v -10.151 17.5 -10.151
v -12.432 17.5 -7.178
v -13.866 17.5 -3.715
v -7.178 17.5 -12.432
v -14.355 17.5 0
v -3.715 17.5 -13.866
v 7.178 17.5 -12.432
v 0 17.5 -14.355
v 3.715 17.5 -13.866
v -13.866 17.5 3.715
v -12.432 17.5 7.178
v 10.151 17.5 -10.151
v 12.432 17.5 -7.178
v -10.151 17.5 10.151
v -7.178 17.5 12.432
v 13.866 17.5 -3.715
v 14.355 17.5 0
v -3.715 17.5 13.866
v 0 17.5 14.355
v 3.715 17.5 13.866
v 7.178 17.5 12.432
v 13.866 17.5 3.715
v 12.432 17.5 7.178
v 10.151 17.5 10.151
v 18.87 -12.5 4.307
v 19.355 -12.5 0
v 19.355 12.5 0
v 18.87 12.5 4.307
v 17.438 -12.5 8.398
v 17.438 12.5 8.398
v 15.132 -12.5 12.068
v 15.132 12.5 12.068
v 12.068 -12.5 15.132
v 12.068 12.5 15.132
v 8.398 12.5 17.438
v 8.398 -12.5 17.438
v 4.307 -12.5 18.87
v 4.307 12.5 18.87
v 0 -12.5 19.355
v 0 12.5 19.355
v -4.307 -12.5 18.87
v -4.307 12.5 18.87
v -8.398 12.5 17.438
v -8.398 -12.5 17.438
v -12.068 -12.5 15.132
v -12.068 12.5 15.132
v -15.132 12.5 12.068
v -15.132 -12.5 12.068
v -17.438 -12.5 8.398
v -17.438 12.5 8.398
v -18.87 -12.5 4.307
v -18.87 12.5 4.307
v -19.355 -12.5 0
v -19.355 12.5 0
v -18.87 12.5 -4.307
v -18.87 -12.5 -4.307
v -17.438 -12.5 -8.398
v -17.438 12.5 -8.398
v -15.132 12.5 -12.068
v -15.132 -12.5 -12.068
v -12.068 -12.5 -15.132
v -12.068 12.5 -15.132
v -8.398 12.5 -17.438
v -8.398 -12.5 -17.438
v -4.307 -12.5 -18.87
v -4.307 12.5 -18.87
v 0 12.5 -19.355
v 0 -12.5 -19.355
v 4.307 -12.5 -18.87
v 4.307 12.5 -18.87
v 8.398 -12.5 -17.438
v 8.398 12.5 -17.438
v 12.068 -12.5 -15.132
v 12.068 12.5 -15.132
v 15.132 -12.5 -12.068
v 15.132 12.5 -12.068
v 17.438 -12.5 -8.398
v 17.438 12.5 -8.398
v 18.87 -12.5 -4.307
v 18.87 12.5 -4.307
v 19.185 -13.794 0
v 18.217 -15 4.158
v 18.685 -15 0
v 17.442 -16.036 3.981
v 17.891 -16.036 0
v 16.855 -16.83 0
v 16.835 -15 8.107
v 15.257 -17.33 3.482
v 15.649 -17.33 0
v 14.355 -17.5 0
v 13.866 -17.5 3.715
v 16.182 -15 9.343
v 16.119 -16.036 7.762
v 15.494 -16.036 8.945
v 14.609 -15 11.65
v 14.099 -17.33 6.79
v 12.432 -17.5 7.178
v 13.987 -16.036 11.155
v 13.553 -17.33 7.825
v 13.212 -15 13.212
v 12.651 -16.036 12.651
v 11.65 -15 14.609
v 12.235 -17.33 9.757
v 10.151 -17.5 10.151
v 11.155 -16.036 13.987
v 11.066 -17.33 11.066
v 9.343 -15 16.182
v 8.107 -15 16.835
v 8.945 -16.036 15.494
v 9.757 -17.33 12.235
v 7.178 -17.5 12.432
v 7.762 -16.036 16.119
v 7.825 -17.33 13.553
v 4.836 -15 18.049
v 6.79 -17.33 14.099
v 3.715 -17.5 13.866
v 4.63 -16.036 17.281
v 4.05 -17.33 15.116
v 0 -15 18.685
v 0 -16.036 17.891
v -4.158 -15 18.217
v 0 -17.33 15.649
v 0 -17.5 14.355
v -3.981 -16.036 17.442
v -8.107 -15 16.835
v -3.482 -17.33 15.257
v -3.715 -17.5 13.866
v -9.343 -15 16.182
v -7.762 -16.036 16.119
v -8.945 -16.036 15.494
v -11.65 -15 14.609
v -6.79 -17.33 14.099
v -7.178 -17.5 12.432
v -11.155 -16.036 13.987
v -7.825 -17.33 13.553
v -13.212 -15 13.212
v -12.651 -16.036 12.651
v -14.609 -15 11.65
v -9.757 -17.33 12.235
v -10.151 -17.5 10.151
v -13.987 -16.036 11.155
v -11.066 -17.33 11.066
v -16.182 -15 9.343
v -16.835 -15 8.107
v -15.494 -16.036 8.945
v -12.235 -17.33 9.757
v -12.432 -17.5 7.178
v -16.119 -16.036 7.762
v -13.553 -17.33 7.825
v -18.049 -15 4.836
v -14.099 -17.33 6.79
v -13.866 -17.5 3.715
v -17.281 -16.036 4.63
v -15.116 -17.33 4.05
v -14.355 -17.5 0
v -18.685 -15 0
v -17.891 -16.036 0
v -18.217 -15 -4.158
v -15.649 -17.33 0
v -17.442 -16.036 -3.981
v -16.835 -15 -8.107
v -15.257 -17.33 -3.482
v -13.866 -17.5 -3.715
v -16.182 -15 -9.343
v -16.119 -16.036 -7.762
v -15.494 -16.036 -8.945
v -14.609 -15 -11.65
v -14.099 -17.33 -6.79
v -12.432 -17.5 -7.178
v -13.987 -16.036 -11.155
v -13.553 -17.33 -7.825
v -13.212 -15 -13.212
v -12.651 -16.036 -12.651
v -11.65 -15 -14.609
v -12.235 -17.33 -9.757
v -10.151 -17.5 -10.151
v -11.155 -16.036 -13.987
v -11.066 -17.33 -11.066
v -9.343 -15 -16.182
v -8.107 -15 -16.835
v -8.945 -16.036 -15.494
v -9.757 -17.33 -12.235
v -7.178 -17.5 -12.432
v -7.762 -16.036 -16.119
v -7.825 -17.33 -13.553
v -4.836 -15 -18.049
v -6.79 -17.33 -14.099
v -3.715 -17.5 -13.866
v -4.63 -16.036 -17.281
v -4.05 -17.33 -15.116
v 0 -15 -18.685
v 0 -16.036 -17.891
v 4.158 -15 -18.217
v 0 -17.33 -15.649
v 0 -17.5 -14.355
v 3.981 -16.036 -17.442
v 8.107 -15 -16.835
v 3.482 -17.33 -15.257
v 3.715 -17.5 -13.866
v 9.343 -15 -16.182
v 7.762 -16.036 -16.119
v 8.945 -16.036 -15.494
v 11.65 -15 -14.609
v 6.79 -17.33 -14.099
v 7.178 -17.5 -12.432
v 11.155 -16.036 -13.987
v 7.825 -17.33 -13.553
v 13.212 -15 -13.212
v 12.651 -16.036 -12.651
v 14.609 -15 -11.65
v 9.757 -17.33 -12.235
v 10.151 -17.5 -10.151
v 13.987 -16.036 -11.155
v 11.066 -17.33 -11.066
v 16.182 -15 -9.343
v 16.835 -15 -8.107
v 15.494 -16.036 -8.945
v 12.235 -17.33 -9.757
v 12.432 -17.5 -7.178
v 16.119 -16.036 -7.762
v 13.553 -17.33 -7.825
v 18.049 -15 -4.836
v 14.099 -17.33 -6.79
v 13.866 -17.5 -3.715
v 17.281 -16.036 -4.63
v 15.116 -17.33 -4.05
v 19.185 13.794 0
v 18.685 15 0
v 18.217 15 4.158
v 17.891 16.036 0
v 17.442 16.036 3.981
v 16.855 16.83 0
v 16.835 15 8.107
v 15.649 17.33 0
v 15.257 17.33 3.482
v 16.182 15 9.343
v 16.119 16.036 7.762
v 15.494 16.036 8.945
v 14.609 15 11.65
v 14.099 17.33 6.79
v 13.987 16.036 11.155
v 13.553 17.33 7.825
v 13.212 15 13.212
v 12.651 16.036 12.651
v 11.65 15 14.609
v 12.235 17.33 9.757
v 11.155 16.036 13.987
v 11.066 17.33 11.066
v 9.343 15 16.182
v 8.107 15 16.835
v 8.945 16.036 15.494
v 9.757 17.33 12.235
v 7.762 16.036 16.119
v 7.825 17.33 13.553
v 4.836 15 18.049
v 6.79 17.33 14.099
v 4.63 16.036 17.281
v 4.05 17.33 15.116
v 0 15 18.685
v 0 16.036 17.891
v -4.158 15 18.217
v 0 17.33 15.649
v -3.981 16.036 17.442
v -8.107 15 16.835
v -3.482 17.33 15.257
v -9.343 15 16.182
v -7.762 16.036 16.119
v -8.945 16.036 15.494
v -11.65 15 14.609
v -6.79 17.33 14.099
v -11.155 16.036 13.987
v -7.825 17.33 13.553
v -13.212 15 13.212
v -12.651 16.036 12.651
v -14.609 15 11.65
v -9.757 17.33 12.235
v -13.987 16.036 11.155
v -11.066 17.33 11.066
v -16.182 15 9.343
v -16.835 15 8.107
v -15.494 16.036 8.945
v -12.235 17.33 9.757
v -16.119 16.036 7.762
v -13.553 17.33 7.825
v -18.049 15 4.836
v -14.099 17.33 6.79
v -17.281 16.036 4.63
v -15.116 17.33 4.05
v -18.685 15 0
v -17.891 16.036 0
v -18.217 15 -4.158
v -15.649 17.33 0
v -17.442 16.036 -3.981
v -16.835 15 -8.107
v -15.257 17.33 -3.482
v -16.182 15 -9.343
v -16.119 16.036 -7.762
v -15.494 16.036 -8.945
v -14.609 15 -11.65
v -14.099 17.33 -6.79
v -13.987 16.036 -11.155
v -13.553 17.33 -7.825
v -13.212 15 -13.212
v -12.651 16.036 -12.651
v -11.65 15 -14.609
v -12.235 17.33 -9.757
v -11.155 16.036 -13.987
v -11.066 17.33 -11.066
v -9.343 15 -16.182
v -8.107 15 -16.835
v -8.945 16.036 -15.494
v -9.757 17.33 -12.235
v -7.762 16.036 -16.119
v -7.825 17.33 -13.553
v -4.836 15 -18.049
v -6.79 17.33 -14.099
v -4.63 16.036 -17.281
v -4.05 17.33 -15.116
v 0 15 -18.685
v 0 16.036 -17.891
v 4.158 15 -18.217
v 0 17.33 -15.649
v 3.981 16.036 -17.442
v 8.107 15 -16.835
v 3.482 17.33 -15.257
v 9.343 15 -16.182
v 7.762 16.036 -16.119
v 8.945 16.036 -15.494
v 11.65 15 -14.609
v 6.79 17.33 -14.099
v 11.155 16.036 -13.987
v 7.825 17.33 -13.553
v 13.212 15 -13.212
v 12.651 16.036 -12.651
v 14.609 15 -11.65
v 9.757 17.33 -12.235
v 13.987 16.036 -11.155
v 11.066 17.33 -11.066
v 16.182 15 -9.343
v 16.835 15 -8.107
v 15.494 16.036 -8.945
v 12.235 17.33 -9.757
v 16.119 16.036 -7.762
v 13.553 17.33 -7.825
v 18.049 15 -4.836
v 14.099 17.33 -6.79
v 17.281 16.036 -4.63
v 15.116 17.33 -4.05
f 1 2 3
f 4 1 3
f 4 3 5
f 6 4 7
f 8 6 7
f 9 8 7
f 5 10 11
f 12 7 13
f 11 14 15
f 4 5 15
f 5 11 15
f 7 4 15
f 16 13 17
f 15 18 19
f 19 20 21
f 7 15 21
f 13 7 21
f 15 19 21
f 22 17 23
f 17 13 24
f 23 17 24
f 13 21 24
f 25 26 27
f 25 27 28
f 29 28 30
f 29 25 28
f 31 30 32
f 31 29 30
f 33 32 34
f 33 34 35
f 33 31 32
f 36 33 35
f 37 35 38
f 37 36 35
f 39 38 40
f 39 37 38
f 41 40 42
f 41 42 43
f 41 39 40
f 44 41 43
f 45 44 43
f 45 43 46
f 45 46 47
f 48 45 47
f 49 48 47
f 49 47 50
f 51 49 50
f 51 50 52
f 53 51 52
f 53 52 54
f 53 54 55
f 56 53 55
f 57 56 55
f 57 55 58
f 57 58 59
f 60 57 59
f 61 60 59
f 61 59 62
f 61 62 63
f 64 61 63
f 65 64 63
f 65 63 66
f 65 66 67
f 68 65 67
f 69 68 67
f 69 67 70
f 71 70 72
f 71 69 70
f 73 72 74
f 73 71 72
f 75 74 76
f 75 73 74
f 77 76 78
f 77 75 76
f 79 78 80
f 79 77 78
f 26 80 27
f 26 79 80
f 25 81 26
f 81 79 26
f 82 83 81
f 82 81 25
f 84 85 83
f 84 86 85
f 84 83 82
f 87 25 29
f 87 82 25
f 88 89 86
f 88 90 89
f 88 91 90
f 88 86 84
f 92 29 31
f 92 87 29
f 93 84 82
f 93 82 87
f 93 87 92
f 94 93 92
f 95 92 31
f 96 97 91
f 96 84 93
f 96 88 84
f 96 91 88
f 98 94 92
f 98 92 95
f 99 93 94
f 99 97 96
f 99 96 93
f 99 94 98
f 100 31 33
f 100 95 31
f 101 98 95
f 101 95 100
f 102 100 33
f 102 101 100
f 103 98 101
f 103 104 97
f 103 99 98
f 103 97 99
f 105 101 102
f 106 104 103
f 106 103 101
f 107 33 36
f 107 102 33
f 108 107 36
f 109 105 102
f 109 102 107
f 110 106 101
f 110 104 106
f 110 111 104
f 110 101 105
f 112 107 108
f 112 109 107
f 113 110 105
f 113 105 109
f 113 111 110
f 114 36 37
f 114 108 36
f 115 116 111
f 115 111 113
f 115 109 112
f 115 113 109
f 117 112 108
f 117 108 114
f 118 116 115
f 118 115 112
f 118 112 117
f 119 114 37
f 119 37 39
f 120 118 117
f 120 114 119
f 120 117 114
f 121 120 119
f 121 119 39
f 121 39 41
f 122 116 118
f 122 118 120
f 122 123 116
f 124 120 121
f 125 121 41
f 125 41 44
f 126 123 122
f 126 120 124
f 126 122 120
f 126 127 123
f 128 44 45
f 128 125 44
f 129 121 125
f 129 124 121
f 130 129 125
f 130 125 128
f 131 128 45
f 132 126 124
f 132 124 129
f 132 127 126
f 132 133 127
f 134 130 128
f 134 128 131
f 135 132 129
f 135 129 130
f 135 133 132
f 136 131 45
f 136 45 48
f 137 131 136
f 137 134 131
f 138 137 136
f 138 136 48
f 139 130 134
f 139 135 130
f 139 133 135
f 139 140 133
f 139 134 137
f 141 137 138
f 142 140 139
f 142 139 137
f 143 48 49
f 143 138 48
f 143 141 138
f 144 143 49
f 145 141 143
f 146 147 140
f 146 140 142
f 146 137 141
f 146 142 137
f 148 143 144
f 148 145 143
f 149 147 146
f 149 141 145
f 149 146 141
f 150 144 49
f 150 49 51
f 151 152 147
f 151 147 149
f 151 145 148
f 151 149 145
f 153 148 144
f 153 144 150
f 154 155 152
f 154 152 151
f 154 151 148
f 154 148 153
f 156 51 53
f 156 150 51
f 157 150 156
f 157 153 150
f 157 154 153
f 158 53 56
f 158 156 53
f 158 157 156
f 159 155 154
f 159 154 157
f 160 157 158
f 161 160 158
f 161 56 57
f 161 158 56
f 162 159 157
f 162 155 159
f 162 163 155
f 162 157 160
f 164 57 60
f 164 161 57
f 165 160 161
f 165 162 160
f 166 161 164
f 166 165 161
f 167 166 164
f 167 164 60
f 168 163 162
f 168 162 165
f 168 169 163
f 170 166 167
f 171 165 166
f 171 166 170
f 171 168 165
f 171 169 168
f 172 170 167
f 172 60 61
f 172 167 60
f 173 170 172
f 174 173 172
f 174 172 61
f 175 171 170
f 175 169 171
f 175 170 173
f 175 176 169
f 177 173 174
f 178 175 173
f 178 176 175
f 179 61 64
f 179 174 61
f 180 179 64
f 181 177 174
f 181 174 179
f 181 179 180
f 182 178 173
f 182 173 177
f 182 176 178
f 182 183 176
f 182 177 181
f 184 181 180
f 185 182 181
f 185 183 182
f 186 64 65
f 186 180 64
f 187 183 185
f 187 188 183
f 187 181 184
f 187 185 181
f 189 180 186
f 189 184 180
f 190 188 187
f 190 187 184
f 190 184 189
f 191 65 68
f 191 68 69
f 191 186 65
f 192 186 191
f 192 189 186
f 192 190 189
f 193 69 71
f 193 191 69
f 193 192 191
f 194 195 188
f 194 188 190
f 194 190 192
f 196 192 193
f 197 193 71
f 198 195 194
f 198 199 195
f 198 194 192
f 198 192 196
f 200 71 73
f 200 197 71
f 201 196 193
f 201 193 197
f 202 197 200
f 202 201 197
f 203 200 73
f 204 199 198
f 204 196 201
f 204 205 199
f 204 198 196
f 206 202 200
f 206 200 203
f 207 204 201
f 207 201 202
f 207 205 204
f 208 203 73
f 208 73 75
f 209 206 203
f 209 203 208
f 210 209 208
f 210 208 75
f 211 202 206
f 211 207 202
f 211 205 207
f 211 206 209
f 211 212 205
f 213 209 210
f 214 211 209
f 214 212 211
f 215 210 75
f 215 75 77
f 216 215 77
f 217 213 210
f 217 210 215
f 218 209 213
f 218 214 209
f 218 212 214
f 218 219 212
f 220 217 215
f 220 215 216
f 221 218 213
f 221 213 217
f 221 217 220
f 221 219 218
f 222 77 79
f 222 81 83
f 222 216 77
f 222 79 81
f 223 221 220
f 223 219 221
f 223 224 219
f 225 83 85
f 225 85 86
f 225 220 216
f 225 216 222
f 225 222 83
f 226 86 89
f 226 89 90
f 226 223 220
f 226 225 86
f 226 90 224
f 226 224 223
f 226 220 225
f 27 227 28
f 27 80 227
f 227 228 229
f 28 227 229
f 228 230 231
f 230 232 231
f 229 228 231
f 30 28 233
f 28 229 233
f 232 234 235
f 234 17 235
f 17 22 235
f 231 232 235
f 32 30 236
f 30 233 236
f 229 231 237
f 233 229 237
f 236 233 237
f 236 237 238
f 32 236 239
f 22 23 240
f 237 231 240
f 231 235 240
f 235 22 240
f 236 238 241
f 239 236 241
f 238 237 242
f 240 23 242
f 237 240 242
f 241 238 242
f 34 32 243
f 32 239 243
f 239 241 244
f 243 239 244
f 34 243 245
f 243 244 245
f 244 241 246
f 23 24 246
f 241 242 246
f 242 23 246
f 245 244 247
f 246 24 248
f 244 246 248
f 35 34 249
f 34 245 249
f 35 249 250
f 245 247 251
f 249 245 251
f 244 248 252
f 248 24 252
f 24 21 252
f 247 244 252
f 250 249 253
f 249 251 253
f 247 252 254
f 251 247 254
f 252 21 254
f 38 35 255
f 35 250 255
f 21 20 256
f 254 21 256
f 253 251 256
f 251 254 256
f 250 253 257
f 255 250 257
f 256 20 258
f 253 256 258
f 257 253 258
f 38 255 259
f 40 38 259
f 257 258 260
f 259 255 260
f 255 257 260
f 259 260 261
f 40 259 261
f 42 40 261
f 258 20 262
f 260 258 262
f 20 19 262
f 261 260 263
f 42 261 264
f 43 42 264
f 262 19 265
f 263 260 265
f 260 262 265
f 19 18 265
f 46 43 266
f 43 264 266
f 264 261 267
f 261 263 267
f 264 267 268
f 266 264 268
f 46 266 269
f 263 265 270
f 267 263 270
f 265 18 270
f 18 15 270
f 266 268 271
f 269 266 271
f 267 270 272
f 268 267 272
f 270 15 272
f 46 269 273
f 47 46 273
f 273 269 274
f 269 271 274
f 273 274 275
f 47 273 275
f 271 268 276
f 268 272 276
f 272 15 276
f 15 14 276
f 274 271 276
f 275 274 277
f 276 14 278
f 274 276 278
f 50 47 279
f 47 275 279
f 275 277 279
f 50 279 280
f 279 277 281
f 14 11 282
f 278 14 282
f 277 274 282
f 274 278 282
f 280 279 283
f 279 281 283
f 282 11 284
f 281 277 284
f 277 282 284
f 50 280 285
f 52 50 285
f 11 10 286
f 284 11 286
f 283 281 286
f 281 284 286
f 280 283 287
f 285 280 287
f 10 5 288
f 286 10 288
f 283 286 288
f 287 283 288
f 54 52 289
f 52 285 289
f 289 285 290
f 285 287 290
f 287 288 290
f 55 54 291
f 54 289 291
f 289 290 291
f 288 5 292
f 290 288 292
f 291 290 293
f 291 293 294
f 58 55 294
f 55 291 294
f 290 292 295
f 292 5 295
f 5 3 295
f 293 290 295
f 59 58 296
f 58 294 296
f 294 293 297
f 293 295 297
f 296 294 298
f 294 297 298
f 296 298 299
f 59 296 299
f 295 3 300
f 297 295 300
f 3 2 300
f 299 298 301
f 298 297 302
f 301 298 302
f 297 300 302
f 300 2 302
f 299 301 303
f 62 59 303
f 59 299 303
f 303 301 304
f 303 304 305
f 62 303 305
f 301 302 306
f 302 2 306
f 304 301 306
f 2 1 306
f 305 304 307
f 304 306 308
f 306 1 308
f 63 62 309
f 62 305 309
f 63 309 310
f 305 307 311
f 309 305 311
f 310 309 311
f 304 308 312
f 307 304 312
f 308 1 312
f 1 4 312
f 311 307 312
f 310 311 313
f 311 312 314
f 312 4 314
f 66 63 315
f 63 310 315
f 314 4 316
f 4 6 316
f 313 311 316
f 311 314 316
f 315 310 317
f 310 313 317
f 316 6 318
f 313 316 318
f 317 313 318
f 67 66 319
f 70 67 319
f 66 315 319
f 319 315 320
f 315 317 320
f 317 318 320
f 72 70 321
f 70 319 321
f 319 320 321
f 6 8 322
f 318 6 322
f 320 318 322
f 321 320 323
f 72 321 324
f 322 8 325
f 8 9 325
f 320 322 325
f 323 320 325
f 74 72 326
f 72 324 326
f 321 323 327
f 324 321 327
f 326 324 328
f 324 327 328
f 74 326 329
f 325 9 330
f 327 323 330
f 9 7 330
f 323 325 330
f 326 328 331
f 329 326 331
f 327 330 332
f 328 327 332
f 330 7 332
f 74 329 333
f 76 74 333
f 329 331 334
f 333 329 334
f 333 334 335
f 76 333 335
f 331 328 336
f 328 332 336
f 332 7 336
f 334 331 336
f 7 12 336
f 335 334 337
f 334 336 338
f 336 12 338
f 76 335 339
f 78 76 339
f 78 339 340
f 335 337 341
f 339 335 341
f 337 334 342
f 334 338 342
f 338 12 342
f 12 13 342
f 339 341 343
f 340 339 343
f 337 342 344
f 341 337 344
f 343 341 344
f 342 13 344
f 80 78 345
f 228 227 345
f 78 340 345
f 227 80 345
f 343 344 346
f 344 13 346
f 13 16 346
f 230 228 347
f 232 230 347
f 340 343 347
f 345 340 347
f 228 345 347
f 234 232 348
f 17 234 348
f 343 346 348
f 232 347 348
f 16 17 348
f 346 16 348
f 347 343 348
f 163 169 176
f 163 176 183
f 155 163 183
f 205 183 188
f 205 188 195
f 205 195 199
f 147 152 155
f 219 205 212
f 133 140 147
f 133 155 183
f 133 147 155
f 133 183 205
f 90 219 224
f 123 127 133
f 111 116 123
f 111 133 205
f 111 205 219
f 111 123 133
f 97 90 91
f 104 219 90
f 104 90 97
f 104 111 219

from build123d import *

# Parameters (mm, degrees)
F0_R     = 19.355113
F1_DEPTH = 17.5
F2_R     = 5
F3_R     = 5


with BuildPart() as f1:
    # F0 (on Front) → F1 (new body, symmetric)
    with BuildSketch(Plane.XZ):
        Circle(F0_R)
    extrude(amount=F1_DEPTH, both=True)

    # F2
    f2_edges = [f1.edges().sort_by_distance(p)[0] for p in [
        (-19.355113, -17.5, 0),
    ]]
    fillet(f2_edges, radius=F2_R)

    # F3
    f3_edges = [f1.edges().sort_by_distance(p)[0] for p in [
        (-19.355113, 17.5, 0),
    ]]
    fillet(f3_edges, radius=F3_R)


solid = f1.part
